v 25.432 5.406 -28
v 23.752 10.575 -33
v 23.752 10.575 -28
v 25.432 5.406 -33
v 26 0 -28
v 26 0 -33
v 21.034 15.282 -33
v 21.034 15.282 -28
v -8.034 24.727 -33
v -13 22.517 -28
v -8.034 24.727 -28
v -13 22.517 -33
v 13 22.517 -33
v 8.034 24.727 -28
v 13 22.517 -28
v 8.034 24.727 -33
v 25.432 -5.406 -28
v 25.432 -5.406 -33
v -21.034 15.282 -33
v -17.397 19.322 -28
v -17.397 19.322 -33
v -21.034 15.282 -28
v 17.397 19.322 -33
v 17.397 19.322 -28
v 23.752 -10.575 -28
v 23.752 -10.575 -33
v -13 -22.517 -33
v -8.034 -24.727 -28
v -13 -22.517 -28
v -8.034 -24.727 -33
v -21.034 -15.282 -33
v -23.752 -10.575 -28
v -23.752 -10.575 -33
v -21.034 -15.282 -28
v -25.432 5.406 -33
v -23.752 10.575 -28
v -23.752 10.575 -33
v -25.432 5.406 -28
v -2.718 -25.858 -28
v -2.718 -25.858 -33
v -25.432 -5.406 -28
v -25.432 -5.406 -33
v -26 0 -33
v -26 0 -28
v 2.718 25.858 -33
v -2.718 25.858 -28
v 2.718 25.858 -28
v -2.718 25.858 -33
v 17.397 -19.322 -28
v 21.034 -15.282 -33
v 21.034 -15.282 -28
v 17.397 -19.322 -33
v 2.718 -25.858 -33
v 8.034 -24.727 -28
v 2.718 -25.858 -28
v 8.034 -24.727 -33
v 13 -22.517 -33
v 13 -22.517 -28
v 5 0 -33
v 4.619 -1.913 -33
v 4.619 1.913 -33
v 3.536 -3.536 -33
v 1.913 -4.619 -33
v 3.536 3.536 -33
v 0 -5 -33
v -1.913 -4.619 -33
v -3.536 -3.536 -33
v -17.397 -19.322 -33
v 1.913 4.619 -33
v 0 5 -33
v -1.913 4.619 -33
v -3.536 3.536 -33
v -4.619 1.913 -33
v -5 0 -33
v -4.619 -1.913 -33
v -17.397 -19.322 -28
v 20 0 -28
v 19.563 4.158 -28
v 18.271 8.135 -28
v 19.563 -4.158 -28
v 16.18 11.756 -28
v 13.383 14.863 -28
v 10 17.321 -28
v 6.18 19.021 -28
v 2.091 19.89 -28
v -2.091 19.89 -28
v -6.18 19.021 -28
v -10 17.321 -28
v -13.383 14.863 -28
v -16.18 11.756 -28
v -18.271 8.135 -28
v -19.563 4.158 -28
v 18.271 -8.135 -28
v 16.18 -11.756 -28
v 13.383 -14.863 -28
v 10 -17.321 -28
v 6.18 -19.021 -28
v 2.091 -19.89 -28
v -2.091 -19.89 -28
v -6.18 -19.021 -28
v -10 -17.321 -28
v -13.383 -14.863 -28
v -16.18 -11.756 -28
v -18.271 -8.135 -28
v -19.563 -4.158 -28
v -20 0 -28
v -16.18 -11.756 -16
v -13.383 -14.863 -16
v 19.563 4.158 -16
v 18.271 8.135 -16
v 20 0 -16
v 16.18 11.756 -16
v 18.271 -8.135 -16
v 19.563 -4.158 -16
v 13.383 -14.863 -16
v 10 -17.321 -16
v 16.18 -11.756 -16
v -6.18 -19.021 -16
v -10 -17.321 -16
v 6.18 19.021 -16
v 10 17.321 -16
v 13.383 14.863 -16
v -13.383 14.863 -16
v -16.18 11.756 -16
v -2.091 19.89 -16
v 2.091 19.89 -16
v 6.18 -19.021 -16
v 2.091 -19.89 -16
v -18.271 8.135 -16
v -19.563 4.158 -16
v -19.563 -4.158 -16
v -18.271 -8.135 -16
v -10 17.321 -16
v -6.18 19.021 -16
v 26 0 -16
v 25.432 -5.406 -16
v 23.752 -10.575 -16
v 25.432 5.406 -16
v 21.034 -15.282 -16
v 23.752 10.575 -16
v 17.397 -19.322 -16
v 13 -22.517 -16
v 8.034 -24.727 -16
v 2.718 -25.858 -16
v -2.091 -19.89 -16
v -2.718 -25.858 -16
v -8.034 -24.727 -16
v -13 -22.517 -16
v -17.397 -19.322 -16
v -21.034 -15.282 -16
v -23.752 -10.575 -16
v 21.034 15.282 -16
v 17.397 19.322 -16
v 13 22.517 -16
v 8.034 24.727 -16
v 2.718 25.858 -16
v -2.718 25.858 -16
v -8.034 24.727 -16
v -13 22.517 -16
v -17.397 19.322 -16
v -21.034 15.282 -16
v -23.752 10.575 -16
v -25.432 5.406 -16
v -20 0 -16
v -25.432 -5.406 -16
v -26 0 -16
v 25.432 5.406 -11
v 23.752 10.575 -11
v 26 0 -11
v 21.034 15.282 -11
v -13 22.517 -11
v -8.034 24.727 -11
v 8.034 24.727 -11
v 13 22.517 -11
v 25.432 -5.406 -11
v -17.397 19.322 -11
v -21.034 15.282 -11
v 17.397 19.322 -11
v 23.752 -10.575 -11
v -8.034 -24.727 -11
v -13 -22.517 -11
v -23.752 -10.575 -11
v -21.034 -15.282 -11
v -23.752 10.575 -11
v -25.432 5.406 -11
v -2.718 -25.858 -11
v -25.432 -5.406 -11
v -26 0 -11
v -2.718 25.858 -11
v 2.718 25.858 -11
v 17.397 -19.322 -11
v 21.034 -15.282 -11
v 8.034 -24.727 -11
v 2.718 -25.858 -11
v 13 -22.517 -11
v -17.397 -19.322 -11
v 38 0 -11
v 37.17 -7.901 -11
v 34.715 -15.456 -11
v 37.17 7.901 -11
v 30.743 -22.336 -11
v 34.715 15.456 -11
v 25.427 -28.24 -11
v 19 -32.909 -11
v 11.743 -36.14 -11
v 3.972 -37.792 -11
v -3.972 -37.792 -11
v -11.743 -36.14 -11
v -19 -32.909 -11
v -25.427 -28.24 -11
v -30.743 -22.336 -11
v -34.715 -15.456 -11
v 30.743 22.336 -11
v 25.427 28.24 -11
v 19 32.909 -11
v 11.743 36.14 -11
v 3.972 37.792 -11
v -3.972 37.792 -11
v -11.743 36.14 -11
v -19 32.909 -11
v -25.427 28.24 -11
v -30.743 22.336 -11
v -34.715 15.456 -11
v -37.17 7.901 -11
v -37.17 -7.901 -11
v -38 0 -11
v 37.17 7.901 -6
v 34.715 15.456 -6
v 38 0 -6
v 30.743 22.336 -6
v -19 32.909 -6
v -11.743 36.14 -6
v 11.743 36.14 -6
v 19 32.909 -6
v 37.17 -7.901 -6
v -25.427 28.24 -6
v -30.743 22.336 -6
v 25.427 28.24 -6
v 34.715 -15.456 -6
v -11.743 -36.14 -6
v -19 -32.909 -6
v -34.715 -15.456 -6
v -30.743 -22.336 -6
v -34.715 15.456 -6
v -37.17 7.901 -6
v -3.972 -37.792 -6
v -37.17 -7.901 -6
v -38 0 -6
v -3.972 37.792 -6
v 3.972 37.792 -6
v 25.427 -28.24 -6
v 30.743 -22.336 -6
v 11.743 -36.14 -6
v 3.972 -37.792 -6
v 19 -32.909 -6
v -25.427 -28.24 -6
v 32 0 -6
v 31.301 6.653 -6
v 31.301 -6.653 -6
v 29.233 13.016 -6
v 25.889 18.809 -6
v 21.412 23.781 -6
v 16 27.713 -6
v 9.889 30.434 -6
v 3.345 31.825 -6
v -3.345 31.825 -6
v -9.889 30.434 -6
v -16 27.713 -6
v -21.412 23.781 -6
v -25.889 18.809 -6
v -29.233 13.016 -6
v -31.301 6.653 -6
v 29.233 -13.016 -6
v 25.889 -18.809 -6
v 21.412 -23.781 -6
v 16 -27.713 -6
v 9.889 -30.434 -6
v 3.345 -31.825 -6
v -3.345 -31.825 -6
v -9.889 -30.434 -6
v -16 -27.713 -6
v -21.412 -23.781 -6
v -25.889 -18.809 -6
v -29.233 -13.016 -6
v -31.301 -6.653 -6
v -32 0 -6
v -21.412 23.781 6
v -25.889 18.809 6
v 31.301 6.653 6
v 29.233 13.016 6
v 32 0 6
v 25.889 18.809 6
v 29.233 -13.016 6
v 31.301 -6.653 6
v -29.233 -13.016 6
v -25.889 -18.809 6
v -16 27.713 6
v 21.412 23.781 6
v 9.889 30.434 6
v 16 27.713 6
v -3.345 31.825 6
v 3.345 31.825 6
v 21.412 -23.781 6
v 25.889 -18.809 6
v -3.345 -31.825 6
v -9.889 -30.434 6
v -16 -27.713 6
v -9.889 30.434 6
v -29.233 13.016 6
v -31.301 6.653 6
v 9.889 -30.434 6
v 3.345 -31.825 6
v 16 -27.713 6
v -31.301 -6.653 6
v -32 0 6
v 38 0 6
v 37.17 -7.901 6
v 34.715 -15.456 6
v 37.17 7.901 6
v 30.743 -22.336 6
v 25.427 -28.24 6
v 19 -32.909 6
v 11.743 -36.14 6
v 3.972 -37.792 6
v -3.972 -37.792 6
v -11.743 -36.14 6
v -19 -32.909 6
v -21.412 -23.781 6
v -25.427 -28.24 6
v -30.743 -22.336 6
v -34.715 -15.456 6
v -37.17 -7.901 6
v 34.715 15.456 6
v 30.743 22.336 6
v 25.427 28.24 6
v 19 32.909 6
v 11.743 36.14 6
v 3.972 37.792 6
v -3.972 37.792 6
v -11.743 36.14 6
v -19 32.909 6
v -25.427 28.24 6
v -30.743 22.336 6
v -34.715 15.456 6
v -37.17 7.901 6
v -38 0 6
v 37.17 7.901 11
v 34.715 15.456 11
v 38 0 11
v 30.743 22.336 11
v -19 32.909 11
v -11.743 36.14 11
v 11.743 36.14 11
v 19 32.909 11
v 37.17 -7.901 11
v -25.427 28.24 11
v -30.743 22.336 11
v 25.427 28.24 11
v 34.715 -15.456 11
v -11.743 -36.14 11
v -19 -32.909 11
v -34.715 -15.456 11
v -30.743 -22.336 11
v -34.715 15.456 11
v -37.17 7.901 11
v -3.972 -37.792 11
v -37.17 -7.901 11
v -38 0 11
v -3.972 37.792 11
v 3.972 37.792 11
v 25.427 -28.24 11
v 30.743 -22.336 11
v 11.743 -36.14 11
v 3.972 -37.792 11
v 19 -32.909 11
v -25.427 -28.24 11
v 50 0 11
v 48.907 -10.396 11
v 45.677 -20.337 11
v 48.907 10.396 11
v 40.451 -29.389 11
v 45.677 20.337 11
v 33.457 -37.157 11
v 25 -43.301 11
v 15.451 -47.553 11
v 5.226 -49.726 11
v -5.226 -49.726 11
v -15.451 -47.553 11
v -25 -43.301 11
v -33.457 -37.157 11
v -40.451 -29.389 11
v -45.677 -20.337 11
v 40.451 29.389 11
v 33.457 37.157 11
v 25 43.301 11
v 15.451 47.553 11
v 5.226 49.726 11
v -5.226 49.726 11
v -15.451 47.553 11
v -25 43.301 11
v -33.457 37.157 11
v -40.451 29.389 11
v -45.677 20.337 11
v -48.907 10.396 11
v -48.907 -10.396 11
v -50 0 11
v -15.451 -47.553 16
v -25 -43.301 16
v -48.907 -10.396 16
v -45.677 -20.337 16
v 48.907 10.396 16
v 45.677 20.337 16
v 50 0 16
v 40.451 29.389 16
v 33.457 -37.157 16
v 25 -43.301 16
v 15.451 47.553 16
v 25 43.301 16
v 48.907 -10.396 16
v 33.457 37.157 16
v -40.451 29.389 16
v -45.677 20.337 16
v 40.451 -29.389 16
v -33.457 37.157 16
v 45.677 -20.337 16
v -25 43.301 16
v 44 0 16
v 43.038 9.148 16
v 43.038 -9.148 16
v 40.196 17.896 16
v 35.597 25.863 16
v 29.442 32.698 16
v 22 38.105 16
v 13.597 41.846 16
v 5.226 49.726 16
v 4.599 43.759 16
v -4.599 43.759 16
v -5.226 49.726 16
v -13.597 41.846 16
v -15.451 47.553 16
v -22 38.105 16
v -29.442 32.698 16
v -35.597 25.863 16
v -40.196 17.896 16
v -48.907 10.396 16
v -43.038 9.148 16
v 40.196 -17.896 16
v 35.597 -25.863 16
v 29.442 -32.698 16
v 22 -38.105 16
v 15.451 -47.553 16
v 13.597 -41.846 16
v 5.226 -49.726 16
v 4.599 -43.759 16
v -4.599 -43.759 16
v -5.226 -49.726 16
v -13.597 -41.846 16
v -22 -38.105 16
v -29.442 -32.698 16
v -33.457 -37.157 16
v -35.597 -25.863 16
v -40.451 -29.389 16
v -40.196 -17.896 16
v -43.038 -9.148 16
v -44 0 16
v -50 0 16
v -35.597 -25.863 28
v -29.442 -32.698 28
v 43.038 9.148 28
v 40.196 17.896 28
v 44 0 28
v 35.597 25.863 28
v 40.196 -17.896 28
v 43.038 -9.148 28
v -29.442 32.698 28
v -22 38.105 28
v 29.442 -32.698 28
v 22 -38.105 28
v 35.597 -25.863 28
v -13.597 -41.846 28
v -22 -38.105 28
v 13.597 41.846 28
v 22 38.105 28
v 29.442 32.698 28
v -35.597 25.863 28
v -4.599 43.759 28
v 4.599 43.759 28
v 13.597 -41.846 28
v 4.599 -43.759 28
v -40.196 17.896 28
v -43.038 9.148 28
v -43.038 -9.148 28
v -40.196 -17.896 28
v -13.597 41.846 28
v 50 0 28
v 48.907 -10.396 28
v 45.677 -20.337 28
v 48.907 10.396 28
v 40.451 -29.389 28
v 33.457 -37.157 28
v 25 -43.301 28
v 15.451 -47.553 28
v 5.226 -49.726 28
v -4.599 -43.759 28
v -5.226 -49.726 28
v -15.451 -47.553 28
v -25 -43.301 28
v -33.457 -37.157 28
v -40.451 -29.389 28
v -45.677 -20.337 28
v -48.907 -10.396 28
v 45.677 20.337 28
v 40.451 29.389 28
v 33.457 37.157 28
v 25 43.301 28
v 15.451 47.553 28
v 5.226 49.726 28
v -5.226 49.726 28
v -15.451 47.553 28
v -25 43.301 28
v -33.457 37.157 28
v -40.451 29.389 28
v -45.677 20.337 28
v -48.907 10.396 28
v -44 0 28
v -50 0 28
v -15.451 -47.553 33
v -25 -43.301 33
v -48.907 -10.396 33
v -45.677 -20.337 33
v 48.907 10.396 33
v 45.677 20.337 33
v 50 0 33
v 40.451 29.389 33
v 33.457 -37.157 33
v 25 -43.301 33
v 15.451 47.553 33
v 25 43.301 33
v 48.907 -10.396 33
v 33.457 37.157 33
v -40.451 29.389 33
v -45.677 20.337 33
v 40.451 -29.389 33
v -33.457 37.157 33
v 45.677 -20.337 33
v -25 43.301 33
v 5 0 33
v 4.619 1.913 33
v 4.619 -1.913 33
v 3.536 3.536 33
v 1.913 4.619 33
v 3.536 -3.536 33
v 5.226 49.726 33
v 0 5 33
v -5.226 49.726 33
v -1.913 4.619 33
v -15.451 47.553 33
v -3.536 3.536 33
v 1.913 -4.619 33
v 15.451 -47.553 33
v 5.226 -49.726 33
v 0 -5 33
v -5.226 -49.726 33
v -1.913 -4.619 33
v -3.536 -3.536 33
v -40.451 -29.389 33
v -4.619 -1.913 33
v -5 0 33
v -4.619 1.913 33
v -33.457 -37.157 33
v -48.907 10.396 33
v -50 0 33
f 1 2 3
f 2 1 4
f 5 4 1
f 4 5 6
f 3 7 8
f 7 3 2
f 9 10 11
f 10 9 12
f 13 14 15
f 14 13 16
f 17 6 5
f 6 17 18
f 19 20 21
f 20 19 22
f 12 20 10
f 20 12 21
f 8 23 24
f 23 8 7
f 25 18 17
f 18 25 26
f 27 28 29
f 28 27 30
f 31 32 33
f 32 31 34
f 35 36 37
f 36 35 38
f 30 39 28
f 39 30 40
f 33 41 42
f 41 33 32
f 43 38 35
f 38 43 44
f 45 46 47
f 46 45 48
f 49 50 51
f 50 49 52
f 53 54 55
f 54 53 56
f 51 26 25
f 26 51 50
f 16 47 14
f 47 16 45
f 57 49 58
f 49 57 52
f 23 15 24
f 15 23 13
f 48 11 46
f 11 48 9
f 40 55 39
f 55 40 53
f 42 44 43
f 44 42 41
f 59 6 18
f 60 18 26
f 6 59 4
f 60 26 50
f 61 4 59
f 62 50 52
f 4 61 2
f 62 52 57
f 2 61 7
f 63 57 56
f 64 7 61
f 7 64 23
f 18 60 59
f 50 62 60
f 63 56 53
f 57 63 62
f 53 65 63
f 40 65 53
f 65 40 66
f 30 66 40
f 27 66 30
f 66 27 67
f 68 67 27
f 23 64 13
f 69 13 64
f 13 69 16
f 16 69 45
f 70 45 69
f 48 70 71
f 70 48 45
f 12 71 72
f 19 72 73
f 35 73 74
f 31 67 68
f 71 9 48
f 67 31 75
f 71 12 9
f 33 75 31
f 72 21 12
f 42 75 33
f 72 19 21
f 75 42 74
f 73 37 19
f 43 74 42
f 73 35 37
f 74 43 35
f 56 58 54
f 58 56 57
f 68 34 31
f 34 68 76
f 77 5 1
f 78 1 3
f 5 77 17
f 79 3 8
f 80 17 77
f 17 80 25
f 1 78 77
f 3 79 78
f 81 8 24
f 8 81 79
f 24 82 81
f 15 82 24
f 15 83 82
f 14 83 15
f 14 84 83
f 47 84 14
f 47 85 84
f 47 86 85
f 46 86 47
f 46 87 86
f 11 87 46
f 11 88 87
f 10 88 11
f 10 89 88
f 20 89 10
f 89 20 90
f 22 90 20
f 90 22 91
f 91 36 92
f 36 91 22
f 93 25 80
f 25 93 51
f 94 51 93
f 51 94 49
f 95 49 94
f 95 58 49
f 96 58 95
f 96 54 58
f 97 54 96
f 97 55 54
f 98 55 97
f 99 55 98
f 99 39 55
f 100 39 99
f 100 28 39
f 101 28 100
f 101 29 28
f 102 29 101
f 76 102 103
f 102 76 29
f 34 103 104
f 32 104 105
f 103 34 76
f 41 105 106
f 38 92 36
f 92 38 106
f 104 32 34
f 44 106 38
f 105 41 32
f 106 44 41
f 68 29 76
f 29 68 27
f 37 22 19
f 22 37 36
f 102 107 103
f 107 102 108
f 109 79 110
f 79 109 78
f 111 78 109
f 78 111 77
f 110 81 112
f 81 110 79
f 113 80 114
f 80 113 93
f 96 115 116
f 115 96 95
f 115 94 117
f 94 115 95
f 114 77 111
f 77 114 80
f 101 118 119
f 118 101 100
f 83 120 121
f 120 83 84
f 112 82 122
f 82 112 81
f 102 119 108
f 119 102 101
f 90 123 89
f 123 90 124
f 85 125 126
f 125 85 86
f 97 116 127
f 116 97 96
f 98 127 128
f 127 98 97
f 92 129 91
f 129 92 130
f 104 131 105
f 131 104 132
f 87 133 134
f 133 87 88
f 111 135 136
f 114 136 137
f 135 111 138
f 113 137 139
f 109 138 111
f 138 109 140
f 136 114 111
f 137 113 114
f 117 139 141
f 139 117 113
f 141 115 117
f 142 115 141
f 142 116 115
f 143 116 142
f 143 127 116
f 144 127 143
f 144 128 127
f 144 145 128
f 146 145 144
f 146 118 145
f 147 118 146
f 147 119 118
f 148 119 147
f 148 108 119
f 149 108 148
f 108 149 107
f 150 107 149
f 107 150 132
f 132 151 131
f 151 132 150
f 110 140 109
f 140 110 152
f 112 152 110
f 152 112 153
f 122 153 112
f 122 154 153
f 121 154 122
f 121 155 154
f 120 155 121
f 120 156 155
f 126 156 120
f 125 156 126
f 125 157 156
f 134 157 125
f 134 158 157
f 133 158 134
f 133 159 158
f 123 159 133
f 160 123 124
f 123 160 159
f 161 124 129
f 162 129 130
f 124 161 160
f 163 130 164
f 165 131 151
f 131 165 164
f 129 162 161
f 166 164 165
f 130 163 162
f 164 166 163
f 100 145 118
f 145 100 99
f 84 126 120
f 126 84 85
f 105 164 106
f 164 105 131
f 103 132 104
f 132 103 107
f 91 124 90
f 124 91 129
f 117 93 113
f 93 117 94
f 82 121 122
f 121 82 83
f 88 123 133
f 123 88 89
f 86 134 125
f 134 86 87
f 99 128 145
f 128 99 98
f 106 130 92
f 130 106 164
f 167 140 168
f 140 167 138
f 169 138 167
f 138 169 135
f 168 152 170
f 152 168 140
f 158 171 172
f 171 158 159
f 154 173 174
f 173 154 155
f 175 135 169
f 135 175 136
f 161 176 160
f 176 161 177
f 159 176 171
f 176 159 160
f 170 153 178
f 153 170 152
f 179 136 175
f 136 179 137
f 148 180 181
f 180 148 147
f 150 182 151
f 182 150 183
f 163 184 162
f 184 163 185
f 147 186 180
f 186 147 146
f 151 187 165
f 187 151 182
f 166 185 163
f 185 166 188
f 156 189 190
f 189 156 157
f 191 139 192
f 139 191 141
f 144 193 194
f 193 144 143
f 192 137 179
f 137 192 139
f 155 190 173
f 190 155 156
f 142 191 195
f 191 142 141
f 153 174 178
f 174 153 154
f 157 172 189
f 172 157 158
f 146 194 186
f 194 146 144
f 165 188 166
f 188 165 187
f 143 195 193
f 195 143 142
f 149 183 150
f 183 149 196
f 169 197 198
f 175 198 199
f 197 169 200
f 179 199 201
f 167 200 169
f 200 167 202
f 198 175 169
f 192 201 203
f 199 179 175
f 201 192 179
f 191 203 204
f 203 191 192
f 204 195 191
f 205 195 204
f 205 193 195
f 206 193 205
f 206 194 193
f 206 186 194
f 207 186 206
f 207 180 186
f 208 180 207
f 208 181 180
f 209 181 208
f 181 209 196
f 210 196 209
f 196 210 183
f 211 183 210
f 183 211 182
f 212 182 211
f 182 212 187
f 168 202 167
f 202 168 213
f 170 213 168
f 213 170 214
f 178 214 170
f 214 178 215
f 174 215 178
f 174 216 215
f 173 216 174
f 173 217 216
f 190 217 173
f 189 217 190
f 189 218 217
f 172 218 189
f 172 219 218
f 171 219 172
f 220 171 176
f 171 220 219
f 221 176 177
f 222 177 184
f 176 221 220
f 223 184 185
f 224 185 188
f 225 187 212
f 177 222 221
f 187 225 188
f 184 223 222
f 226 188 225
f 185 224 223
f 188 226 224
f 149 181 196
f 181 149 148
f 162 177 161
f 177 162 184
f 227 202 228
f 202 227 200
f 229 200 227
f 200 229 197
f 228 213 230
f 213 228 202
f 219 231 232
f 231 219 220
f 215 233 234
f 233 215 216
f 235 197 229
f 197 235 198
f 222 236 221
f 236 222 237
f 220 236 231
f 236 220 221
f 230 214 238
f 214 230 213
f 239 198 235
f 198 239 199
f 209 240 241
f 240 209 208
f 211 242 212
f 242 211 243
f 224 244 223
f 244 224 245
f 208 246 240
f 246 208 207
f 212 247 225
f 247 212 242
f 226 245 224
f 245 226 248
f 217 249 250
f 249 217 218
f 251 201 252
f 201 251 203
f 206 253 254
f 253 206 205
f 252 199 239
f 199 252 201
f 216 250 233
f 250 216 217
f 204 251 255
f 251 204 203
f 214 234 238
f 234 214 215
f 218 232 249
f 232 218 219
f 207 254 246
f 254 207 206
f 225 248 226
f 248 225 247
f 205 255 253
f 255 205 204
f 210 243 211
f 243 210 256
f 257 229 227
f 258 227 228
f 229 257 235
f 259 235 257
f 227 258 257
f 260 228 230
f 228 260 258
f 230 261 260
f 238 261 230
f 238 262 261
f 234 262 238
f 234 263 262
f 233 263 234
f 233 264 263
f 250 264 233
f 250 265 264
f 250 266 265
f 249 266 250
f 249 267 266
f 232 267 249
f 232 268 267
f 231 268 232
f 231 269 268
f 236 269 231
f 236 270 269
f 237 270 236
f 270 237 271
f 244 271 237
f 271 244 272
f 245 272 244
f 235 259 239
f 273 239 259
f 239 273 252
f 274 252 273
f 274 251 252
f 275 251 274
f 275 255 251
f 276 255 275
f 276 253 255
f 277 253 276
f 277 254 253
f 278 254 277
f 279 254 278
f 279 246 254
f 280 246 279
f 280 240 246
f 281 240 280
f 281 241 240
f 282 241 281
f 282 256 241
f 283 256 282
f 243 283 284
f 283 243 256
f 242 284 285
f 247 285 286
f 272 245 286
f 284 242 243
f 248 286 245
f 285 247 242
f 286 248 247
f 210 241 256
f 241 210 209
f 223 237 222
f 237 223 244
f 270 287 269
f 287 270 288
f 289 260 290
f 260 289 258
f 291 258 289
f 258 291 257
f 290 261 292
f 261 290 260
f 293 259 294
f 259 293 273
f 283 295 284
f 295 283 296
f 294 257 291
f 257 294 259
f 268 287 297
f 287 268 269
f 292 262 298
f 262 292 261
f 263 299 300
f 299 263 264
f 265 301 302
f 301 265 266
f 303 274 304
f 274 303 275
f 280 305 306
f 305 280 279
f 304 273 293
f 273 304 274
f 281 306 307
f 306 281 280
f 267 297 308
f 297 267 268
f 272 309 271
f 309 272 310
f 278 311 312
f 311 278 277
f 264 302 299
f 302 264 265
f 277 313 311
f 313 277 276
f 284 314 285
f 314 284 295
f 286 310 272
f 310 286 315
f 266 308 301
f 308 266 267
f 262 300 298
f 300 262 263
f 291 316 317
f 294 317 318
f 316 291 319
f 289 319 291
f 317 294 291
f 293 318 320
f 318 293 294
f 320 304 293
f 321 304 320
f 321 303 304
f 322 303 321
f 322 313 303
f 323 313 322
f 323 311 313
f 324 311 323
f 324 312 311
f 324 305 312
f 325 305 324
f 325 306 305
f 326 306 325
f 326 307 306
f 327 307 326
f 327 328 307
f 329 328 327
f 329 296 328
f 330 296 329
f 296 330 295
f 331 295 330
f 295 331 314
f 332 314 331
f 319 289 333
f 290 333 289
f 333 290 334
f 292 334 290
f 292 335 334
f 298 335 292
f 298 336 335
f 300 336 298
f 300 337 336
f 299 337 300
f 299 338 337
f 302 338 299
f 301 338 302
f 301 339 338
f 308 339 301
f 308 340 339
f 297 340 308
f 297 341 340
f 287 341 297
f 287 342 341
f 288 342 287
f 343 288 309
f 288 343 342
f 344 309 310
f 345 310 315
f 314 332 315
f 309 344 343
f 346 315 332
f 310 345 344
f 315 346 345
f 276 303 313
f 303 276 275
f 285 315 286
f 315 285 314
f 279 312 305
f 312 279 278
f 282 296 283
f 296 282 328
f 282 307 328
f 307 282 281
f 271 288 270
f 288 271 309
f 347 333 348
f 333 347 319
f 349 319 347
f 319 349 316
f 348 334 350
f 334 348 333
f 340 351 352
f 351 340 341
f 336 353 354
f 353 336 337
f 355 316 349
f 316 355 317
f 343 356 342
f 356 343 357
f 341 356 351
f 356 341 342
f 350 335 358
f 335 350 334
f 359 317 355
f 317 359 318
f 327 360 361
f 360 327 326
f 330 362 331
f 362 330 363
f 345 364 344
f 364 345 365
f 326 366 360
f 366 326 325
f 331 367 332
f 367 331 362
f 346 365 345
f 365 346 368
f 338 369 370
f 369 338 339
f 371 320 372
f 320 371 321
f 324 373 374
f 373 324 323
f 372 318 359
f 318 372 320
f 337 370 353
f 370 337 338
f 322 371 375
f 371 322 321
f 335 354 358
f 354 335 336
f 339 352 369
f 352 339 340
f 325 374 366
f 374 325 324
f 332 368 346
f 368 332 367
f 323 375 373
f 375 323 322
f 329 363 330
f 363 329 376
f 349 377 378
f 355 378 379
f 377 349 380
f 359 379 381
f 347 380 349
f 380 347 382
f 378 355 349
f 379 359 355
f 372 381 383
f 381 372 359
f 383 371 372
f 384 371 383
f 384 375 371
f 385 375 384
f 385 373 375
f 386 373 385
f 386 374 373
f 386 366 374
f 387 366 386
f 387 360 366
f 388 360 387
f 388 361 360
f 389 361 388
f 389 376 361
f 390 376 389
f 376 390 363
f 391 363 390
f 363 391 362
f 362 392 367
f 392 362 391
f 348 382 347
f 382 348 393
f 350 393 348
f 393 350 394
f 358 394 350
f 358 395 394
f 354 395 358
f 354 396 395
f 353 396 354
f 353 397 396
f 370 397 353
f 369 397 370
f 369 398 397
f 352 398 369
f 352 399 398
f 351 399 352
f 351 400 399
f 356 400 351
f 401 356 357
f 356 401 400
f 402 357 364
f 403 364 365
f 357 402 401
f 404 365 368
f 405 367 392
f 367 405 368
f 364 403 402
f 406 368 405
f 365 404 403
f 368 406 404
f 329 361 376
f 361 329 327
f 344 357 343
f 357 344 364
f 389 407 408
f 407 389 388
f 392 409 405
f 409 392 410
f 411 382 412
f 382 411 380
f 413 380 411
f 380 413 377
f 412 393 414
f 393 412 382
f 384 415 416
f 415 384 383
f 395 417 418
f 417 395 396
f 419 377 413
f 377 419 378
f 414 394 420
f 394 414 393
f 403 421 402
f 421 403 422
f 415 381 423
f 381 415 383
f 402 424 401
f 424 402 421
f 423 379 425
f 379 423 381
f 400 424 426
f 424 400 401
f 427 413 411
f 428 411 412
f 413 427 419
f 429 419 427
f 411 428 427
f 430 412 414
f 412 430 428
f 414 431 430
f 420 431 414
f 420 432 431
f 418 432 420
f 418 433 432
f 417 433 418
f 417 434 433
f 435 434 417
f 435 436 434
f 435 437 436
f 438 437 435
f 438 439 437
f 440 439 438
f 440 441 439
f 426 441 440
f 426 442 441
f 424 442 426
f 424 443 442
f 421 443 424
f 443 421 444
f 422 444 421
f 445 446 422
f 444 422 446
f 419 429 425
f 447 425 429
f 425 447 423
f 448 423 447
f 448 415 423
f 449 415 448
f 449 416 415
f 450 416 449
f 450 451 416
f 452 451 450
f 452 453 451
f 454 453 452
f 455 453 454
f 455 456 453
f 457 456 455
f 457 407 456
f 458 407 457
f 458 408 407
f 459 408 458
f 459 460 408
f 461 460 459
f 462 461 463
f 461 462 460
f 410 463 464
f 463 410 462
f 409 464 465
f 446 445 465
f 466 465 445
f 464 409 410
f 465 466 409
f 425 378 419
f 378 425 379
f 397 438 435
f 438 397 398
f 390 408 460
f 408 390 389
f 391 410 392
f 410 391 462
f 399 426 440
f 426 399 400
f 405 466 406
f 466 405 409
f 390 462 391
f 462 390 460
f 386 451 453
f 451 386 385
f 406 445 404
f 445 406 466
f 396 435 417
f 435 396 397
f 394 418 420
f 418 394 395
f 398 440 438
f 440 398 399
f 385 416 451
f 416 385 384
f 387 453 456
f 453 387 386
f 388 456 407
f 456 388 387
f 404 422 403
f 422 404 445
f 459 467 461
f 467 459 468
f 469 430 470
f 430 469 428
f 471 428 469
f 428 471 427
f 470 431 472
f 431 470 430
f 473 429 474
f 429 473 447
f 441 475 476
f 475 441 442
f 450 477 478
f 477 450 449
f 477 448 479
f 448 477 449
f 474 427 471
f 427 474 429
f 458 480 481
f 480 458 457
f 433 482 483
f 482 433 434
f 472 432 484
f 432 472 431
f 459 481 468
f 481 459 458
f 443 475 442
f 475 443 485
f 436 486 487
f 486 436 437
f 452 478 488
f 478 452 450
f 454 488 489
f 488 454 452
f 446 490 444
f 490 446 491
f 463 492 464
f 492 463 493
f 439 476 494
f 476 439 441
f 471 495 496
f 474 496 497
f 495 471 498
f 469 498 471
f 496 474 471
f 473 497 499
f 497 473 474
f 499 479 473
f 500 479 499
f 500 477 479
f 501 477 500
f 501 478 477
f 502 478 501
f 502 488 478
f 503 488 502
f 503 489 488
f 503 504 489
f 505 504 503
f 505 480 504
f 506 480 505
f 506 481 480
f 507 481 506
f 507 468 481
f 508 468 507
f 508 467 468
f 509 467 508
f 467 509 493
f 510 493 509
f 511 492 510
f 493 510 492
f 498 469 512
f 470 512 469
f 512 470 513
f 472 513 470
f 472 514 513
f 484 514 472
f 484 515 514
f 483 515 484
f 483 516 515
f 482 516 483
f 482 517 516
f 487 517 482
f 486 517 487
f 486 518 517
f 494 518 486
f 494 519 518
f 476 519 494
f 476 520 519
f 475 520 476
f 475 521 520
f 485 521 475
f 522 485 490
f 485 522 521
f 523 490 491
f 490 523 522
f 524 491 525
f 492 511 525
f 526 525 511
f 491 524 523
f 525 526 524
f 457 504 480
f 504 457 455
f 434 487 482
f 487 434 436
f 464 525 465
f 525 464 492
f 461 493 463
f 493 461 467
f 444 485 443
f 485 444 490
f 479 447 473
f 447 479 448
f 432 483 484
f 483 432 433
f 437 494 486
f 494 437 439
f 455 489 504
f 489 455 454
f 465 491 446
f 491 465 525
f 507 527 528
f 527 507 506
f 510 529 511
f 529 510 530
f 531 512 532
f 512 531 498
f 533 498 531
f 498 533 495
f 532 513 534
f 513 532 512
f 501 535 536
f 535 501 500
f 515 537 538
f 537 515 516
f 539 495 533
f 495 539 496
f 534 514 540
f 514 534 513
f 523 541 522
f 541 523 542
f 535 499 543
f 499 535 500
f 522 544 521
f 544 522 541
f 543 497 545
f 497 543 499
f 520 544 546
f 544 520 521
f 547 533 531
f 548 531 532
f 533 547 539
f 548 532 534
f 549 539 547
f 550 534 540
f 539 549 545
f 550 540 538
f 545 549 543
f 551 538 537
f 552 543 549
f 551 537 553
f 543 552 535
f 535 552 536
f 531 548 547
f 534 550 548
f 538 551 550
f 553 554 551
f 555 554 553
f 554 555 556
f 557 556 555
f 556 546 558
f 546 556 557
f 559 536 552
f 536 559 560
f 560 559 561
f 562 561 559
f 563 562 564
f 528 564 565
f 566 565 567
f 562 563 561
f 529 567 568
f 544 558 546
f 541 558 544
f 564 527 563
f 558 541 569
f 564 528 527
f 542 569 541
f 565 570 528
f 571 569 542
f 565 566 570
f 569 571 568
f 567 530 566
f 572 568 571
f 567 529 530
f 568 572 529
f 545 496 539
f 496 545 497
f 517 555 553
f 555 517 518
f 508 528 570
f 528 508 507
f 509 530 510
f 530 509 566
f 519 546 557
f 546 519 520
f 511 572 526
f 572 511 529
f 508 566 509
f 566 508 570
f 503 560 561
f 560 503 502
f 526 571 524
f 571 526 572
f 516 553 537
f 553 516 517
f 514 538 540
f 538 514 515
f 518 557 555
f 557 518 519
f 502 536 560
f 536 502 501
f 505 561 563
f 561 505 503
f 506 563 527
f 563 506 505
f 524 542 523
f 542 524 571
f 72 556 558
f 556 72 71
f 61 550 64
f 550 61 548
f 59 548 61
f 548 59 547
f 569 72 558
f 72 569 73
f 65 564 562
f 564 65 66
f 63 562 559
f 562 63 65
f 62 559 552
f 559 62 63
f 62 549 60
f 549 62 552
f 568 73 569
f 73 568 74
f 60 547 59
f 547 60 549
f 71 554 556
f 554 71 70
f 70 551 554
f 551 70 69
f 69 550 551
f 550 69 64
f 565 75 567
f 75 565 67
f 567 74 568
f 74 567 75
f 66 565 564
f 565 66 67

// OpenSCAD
// 3DScad sample: step pulley (3-speed belt drive)
// Uses only the currently round-trippable subset.

module scene_model() {
    step_count = 3;
    step_r_min = 20;
    step_r_inc = 12;
    step_h = 12;
    flange_h = 5;
    flange_extra = 6;
    hub_r = 10;
    bore_r = 5;
    tier_h = step_h + flange_h * 2;
    total_h = step_count * tier_h;

    difference() {
        union() {
            cylinder(h=total_h, r=hub_r, center=true);
            for (i = [0 : 1 : step_count - 1]) {
                translate([0, 0, -total_h / 2 + i * tier_h + flange_h / 2]) {
                    cylinder(h=flange_h, r=step_r_min + i * step_r_inc + flange_extra, center=true);
                }
                translate([0, 0, -total_h / 2 + i * tier_h + flange_h + step_h / 2]) {
                    cylinder(h=step_h, r=step_r_min + i * step_r_inc, center=true);
                }
                translate([0, 0, -total_h / 2 + i * tier_h + flange_h + step_h + flange_h / 2]) {
                    cylinder(h=flange_h, r=step_r_min + i * step_r_inc + flange_extra, center=true);
                }
            }
        }
        cylinder(h=total_h + 2, r=bore_r, center=true);
    }
}

scene_model();
